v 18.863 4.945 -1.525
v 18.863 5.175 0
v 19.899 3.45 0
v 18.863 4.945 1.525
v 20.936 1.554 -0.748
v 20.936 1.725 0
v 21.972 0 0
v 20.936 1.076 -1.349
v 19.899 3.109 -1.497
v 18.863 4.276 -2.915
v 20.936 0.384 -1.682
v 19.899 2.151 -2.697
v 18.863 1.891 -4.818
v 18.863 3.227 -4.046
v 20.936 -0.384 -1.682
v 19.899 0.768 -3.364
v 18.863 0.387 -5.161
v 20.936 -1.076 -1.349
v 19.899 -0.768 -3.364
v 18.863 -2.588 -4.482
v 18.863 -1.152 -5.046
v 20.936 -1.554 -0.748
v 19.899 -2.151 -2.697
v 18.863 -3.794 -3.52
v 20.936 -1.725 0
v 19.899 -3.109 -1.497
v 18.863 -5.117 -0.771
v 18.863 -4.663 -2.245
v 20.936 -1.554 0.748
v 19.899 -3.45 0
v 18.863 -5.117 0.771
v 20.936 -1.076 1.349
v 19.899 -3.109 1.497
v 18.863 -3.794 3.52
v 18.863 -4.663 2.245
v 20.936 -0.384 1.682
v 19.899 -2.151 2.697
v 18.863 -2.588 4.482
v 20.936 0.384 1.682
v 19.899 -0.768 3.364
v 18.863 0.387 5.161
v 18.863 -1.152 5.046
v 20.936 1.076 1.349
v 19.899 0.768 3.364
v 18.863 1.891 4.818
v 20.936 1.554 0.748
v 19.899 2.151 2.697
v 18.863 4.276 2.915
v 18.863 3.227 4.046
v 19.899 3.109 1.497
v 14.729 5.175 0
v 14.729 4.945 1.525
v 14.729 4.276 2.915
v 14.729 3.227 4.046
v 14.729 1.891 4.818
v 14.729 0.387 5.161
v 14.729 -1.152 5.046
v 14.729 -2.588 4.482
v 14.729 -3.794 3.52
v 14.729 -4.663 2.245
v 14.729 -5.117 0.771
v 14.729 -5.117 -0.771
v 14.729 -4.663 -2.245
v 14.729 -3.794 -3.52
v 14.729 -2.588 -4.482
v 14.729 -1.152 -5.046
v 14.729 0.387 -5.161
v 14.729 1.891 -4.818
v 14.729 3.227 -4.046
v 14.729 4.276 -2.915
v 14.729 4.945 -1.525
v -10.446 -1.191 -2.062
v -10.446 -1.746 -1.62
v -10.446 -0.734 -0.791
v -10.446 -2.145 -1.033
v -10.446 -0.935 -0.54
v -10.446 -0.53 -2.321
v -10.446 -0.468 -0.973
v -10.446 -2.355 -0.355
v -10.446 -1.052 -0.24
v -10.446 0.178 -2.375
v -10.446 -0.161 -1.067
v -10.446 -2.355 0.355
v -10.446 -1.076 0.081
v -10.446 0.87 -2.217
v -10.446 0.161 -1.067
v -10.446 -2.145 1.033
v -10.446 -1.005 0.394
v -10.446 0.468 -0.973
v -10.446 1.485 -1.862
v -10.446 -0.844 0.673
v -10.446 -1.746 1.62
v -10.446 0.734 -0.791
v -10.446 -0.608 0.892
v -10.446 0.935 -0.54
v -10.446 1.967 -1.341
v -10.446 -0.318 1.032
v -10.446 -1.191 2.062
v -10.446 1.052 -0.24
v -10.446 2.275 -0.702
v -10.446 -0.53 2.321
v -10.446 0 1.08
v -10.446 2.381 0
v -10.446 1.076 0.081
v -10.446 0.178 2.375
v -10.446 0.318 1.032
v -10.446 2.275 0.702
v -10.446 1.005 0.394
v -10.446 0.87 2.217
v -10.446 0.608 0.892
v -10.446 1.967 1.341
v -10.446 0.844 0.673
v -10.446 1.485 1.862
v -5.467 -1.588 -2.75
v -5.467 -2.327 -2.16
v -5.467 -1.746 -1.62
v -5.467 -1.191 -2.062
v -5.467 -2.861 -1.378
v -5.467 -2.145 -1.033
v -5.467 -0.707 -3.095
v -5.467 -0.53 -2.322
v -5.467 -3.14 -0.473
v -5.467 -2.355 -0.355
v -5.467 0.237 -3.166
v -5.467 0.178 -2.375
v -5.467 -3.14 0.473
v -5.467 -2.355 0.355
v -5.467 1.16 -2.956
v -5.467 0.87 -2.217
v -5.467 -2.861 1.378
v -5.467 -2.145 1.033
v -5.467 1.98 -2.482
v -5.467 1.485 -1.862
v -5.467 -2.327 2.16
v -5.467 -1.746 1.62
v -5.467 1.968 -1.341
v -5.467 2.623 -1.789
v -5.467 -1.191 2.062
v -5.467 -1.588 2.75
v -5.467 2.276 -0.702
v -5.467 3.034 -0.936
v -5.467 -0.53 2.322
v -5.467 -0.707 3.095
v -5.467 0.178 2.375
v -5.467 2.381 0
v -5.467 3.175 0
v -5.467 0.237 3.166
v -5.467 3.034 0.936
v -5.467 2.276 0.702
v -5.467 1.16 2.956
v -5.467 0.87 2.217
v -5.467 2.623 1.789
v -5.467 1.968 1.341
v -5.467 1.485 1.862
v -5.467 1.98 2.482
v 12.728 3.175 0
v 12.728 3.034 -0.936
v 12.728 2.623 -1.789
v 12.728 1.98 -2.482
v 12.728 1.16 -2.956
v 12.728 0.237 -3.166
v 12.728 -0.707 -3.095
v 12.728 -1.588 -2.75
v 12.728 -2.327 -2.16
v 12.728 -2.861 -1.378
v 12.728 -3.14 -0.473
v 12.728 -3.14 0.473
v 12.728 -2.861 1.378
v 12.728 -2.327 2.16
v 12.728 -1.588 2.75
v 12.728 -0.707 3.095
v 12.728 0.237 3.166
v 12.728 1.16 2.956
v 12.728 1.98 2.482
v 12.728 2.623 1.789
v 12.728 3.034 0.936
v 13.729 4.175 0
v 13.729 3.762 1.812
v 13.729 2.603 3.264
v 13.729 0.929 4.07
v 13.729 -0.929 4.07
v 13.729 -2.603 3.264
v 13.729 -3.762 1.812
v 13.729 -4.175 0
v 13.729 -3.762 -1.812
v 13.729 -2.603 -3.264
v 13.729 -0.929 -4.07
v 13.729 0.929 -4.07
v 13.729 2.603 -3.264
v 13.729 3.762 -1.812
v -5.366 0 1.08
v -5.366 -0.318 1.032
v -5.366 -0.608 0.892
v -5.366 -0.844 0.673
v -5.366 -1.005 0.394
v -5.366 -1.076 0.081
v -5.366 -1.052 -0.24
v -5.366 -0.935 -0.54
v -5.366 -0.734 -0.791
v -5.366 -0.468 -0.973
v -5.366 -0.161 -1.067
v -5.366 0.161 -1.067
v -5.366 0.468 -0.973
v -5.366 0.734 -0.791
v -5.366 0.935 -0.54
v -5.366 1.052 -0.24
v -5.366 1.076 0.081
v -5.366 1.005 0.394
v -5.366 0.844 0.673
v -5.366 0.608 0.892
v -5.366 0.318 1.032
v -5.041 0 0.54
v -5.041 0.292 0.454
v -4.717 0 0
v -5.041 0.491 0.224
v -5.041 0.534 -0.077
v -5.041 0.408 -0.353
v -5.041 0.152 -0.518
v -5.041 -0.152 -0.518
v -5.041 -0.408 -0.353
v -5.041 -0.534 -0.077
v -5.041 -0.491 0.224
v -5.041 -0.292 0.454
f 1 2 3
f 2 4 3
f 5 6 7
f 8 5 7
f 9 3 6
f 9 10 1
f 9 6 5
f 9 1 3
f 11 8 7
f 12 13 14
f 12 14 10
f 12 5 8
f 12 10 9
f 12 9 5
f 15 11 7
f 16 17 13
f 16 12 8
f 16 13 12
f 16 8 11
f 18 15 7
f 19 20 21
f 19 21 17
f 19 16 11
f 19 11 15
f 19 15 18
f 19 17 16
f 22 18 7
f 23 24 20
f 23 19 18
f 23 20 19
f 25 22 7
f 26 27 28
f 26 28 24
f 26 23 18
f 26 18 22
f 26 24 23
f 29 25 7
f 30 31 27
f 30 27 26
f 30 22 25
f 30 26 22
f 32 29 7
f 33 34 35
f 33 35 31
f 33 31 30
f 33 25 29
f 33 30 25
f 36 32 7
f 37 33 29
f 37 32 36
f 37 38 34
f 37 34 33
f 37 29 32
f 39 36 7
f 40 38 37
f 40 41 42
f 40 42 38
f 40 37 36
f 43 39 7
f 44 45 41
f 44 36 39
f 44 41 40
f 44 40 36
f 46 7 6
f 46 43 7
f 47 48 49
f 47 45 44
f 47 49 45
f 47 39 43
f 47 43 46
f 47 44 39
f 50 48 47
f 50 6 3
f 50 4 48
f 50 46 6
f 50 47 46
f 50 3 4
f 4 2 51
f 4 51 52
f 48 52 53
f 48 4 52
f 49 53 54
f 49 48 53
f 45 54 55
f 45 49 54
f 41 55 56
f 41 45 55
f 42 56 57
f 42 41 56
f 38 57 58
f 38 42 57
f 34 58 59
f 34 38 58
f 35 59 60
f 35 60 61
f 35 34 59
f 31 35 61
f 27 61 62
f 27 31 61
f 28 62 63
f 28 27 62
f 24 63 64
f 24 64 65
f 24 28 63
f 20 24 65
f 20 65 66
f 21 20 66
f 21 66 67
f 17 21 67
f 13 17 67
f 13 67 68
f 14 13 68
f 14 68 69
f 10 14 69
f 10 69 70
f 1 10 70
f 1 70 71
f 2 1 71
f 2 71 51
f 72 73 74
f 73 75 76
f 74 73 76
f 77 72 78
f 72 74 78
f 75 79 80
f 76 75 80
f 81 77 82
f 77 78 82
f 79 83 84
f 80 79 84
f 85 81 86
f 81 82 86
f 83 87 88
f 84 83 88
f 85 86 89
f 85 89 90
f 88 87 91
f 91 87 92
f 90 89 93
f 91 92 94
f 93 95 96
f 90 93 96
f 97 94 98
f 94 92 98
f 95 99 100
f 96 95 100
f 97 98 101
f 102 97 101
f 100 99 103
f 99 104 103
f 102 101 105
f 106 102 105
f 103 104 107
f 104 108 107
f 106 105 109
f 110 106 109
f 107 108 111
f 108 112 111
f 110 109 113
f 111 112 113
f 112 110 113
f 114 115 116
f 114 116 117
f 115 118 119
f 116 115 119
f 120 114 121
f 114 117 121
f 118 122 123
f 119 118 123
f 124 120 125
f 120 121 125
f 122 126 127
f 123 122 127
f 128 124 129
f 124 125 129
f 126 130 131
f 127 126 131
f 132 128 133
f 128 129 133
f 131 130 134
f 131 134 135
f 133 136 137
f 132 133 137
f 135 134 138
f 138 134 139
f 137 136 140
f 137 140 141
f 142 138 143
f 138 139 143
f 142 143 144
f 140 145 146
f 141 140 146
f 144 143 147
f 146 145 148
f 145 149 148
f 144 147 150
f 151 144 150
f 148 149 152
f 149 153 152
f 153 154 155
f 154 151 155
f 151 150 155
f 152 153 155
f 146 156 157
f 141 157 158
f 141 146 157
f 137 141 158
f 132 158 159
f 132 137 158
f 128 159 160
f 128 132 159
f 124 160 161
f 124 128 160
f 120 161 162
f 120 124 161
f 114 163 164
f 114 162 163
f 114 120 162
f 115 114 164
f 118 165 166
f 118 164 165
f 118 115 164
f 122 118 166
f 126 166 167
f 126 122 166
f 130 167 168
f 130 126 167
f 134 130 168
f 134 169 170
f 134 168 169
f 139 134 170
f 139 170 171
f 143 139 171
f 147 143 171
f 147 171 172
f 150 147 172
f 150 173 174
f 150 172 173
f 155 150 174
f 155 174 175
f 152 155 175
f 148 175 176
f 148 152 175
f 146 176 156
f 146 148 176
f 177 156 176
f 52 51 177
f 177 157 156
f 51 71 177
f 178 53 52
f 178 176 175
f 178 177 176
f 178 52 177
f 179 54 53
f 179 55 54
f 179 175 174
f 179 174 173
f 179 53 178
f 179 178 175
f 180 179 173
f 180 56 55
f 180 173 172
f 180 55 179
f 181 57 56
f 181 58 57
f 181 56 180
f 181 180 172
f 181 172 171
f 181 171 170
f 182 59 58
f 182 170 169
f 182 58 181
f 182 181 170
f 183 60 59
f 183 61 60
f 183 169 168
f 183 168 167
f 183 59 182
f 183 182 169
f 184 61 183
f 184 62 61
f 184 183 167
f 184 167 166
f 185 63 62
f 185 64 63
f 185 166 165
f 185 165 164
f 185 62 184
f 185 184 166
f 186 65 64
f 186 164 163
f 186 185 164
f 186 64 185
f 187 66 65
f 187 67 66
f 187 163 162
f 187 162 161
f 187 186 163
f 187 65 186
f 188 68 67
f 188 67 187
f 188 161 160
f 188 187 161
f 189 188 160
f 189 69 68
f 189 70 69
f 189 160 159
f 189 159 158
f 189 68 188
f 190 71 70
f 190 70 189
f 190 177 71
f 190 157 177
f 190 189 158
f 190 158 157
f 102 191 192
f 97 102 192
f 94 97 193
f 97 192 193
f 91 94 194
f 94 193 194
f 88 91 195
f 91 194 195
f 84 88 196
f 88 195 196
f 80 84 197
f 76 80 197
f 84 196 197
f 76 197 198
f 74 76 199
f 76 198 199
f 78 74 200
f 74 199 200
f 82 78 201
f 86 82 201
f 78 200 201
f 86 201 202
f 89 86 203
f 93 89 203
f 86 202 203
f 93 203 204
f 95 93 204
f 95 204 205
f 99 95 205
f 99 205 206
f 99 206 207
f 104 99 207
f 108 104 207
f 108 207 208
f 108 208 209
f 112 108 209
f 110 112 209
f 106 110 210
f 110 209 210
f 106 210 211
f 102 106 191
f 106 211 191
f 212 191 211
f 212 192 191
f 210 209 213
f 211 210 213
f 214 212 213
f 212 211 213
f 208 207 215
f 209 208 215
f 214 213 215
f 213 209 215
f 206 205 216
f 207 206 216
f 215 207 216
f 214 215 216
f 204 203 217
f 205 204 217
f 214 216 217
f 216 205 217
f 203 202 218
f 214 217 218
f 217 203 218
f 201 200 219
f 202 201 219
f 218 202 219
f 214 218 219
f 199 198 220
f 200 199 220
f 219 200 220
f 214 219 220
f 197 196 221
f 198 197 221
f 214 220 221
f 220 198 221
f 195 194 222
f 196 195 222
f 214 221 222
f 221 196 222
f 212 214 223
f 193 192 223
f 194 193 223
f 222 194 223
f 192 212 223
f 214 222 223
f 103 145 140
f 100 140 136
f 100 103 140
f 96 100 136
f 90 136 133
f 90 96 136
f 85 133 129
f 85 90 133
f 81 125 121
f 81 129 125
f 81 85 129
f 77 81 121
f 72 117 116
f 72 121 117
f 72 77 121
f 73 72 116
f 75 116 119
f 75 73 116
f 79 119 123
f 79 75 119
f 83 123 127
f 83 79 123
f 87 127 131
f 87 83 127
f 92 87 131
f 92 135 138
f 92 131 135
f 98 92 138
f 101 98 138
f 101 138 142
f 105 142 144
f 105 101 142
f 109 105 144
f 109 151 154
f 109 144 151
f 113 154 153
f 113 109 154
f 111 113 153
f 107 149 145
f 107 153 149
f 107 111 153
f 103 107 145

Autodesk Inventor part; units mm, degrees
ref_plane "YZ Plane" through (0, 0, 0) normal (1, 0, 0) x (0, 1, 0)
ref_plane "XZ Plane" through (0, 0, 0) normal (0, 1, 0) x (-1, 0, 0)
ref_plane "XY Plane" through (0, 0, 0) normal (0, 0, 1) x (1, 0, 0)
sketch "Sketch1" plane through (0, 0, 0) normal (0, 0, 1) x (1, 0, 0)
  line L0 (0, 0) -> (21.9725, 0)
  line L1 (40.4812, 0) -> (40.4812, 7.9375) construction
  line L2 (40.4812, 7.9375) -> (31.75, 7.9375)
  line L3 (0, 7.9375) -> (0, 6.35)
  line L4 (31.75, 0) -> (31.75, 7.9375) construction
  line L5 (31.75, 9.525) -> (22.225, 9.525)
  line L6 (22.225, 9.525) -> (22.225, 7.9375)
  line L7 (8.7312, 0) -> (8.7312, 17.4625) construction
  line L8 (8.7312, 17.4625) -> (0, 17.4625) construction
  line L9 (0, 17.4625) -> (0, 7.9375) construction
  line L10 (8.7312, 14.2875) -> (9.525, 14.2875) construction
  line L11 (9.525, 14.2875) -> (9.525, 7.9375) construction
  line L12 (9.525, 14.2875) -> (9.525, 27.94) construction
  line L13 (9.525, 27.94) -> (19.05, 27.94) construction
  line L14 (19.05, 27.94) -> (19.05, 7.9375) construction
  line L15 (22.225, 9.525) -> (22.225, 14.2875) construction
  line L16 (22.225, 14.2875) -> (21.4312, 14.2875) construction
  line L17 (21.4312, 14.2875) -> (21.4312, 7.9375) construction
  line L18 (21.4312, 14.2875) -> (21.4312, 17.4625) construction
  line L19 (21.4312, 17.4625) -> (14.2875, 17.4625) construction
  line L20 (14.2875, 17.4625) -> (14.2875, 0) construction
  line L21 (14.2875, 27.94) -> (14.2875, 17.4625) construction
  line L22 (14.1605, 27.94) -> (14.1605, 0) construction
  line L23 (11.9062, 27.94) -> (11.9062, 0) construction
  circle A0 centre (11.9062, 7.5565) radius 2.3813 construction
  line L24 (0, 5.5562) -> (6.2514, 5.5563) construction
  line L25 (0, 6.35) -> (6.2514, 6.35)
  line L26 (6.2514, 6.35) -> (6.2514, 5.5563)
  line L27 (6.2514, 5.5563) -> (6.2514, 0) construction
  line L28 (9.8391, 5.1753) -> (13.9734, 5.1753) construction
  line L29 (0, 3.175) -> (12.7284, 3.175)
  line L30 (6.2514, 5.5563) -> (19.0308, 5.5563)
  line L31 (0, 6.35) -> (0, 0) construction
  circle A1 centre (11.9062, 5.5562) radius 2.3813 construction
  circle A2 centre (11.9062, 5.8103) radius 2.3813 construction
  line L32 (14.2875, 8.1915) -> (9.525, 8.1915) construction
  line L33 (0, 3.175) -> (-5.4674, 3.175)
  line L34 (-5.4674, 3.175) -> (-5.4674, 2.3813)
  line L35 (-5.4674, 2.3813) -> (-10.4458, 2.3812)
  line L36 (-10.4458, 2.3812) -> (-10.4458, 0)
  line L37 (-10.4458, 0) -> (0, 0)
  line L38 (9.8391, 5.1753) -> (7.8389, 3.175) construction
  line L39 (12.7284, 3.175) -> (14.7286, 5.1753)
  line L40 (13.9734, 5.1753) -> (17.083, 0) construction
  line L41 (14.7286, 5.1753) -> (18.8629, 5.1753)
  line L42 (18.8629, 5.1753) -> (21.9725, 0)
  line L43 (19.0308, 5.5563) -> (22.3693, 0)
  line L44 (22.225, 5.5563) -> (31.75, 5.5563) construction
  line L45 (19.0308, 5.5563) -> (22.225, 5.5563) construction
  line L46 (22.225, 7.9375) -> (22.225, 0) construction
  line L47 (31.75, 7.9375) -> (31.75, 9.525)
  line L48 (31.75, 7.9375) -> (22.225, 7.9375) construction
  line L49 (22.225, 7.9375) -> (0, 7.9375)
  line L50 (31.75, 5.5563) -> (40.4812, 5.5563) construction
  line L51 (22.225, 0) -> (40.4812, 0)
  line L52 (22.3693, 0) -> (22.225, 0)
  line L53 (21.9725, 0) -> (22.3693, 0) construction
  line L54 (12.7284, 3.175) -> (40.4812, 3.175) construction
  line L55 (40.4812, 7.9375) -> (101.6, 7.9375)
  line L56 (101.6, 7.9375) -> (101.6, 0)
  line L57 (101.6, 0) -> (40.4812, 0)
  dimension "d0" = 7.9375
  dimension "d1" = 40.4813
  dimension "d2" = 9.525
  dimension "d3" = 8.7312
  dimension "d5" = 22.225
  dimension "d6" = 17.4625
  dimension "d7" = 8.7312
  dimension "d8" = 0.7937
  dimension "d9" = 14.2875
  dimension "d10" = 27.94
  dimension "d11" = 9.525
  dimension "d12" = 0.7937
  dimension "d14" = 7.1437
  dimension "d15" = 17.4625
  dimension "d16" = 0.127
  dimension "d17" = 4.7625
  dimension "d18" = 4.7625
  dimension "d19" = 5.5563
  dimension "d20" = 6.35
  dimension "d22" = 3.175
  dimension "d23" = 4.7625
  dimension "d24" = 4.7625
  dimension "d25" = 4.7625
  dimension "d26" = 0.254
  dimension "d27" = 2.0671
  dimension "d29" = 0.381
  dimension "d30" = 5.4673
  dimension "d31" = 4.9784
  dimension "d32" = 2.3813
  dimension "d33" = 45
  dimension "d34" = 45
  dimension "d35" = 0.0635
  dimension "d36" = 2.0671
  dimension "d37" = 59
  dimension "d38" = 4.1342
  dimension "d39" = 1.5875
  dimension "d40" = 0.3969
  dimension "d41" = 9.525
  dimension "d42" = 14.2875
  dimension "d43" = 61.1187
revolve "Revolution1" add sketch "Sketch1" angle 360 about axis through (0, 0, 0) along (1, 0, 0) contours L37 L36 L35 L34 L33 L29 L39 L41 L42 L0
sketch "Sketch2" plane through (-10.4457, 0, 0) normal (-1, 0, 0) x (0, 0, 1)
  circle A0 centre (0, 0) radius 2.3813 projected
hole "Hole1" at (-10.4457, 0, 0) direction (1, 0, 0) diameter 2.159 depth 5.08 tip angle 118
equation "\"d7\" = d3"
equation "\"d12\" = d8"
equation "\"d15\" = d6"
equation "\"d34\" = d33"
equation "\"d36\" = d27"
equation "\"d38\" = d27 + d36"
equation "\"d42\" = d9"
properties part number "Ball Shift" material "Steel"
